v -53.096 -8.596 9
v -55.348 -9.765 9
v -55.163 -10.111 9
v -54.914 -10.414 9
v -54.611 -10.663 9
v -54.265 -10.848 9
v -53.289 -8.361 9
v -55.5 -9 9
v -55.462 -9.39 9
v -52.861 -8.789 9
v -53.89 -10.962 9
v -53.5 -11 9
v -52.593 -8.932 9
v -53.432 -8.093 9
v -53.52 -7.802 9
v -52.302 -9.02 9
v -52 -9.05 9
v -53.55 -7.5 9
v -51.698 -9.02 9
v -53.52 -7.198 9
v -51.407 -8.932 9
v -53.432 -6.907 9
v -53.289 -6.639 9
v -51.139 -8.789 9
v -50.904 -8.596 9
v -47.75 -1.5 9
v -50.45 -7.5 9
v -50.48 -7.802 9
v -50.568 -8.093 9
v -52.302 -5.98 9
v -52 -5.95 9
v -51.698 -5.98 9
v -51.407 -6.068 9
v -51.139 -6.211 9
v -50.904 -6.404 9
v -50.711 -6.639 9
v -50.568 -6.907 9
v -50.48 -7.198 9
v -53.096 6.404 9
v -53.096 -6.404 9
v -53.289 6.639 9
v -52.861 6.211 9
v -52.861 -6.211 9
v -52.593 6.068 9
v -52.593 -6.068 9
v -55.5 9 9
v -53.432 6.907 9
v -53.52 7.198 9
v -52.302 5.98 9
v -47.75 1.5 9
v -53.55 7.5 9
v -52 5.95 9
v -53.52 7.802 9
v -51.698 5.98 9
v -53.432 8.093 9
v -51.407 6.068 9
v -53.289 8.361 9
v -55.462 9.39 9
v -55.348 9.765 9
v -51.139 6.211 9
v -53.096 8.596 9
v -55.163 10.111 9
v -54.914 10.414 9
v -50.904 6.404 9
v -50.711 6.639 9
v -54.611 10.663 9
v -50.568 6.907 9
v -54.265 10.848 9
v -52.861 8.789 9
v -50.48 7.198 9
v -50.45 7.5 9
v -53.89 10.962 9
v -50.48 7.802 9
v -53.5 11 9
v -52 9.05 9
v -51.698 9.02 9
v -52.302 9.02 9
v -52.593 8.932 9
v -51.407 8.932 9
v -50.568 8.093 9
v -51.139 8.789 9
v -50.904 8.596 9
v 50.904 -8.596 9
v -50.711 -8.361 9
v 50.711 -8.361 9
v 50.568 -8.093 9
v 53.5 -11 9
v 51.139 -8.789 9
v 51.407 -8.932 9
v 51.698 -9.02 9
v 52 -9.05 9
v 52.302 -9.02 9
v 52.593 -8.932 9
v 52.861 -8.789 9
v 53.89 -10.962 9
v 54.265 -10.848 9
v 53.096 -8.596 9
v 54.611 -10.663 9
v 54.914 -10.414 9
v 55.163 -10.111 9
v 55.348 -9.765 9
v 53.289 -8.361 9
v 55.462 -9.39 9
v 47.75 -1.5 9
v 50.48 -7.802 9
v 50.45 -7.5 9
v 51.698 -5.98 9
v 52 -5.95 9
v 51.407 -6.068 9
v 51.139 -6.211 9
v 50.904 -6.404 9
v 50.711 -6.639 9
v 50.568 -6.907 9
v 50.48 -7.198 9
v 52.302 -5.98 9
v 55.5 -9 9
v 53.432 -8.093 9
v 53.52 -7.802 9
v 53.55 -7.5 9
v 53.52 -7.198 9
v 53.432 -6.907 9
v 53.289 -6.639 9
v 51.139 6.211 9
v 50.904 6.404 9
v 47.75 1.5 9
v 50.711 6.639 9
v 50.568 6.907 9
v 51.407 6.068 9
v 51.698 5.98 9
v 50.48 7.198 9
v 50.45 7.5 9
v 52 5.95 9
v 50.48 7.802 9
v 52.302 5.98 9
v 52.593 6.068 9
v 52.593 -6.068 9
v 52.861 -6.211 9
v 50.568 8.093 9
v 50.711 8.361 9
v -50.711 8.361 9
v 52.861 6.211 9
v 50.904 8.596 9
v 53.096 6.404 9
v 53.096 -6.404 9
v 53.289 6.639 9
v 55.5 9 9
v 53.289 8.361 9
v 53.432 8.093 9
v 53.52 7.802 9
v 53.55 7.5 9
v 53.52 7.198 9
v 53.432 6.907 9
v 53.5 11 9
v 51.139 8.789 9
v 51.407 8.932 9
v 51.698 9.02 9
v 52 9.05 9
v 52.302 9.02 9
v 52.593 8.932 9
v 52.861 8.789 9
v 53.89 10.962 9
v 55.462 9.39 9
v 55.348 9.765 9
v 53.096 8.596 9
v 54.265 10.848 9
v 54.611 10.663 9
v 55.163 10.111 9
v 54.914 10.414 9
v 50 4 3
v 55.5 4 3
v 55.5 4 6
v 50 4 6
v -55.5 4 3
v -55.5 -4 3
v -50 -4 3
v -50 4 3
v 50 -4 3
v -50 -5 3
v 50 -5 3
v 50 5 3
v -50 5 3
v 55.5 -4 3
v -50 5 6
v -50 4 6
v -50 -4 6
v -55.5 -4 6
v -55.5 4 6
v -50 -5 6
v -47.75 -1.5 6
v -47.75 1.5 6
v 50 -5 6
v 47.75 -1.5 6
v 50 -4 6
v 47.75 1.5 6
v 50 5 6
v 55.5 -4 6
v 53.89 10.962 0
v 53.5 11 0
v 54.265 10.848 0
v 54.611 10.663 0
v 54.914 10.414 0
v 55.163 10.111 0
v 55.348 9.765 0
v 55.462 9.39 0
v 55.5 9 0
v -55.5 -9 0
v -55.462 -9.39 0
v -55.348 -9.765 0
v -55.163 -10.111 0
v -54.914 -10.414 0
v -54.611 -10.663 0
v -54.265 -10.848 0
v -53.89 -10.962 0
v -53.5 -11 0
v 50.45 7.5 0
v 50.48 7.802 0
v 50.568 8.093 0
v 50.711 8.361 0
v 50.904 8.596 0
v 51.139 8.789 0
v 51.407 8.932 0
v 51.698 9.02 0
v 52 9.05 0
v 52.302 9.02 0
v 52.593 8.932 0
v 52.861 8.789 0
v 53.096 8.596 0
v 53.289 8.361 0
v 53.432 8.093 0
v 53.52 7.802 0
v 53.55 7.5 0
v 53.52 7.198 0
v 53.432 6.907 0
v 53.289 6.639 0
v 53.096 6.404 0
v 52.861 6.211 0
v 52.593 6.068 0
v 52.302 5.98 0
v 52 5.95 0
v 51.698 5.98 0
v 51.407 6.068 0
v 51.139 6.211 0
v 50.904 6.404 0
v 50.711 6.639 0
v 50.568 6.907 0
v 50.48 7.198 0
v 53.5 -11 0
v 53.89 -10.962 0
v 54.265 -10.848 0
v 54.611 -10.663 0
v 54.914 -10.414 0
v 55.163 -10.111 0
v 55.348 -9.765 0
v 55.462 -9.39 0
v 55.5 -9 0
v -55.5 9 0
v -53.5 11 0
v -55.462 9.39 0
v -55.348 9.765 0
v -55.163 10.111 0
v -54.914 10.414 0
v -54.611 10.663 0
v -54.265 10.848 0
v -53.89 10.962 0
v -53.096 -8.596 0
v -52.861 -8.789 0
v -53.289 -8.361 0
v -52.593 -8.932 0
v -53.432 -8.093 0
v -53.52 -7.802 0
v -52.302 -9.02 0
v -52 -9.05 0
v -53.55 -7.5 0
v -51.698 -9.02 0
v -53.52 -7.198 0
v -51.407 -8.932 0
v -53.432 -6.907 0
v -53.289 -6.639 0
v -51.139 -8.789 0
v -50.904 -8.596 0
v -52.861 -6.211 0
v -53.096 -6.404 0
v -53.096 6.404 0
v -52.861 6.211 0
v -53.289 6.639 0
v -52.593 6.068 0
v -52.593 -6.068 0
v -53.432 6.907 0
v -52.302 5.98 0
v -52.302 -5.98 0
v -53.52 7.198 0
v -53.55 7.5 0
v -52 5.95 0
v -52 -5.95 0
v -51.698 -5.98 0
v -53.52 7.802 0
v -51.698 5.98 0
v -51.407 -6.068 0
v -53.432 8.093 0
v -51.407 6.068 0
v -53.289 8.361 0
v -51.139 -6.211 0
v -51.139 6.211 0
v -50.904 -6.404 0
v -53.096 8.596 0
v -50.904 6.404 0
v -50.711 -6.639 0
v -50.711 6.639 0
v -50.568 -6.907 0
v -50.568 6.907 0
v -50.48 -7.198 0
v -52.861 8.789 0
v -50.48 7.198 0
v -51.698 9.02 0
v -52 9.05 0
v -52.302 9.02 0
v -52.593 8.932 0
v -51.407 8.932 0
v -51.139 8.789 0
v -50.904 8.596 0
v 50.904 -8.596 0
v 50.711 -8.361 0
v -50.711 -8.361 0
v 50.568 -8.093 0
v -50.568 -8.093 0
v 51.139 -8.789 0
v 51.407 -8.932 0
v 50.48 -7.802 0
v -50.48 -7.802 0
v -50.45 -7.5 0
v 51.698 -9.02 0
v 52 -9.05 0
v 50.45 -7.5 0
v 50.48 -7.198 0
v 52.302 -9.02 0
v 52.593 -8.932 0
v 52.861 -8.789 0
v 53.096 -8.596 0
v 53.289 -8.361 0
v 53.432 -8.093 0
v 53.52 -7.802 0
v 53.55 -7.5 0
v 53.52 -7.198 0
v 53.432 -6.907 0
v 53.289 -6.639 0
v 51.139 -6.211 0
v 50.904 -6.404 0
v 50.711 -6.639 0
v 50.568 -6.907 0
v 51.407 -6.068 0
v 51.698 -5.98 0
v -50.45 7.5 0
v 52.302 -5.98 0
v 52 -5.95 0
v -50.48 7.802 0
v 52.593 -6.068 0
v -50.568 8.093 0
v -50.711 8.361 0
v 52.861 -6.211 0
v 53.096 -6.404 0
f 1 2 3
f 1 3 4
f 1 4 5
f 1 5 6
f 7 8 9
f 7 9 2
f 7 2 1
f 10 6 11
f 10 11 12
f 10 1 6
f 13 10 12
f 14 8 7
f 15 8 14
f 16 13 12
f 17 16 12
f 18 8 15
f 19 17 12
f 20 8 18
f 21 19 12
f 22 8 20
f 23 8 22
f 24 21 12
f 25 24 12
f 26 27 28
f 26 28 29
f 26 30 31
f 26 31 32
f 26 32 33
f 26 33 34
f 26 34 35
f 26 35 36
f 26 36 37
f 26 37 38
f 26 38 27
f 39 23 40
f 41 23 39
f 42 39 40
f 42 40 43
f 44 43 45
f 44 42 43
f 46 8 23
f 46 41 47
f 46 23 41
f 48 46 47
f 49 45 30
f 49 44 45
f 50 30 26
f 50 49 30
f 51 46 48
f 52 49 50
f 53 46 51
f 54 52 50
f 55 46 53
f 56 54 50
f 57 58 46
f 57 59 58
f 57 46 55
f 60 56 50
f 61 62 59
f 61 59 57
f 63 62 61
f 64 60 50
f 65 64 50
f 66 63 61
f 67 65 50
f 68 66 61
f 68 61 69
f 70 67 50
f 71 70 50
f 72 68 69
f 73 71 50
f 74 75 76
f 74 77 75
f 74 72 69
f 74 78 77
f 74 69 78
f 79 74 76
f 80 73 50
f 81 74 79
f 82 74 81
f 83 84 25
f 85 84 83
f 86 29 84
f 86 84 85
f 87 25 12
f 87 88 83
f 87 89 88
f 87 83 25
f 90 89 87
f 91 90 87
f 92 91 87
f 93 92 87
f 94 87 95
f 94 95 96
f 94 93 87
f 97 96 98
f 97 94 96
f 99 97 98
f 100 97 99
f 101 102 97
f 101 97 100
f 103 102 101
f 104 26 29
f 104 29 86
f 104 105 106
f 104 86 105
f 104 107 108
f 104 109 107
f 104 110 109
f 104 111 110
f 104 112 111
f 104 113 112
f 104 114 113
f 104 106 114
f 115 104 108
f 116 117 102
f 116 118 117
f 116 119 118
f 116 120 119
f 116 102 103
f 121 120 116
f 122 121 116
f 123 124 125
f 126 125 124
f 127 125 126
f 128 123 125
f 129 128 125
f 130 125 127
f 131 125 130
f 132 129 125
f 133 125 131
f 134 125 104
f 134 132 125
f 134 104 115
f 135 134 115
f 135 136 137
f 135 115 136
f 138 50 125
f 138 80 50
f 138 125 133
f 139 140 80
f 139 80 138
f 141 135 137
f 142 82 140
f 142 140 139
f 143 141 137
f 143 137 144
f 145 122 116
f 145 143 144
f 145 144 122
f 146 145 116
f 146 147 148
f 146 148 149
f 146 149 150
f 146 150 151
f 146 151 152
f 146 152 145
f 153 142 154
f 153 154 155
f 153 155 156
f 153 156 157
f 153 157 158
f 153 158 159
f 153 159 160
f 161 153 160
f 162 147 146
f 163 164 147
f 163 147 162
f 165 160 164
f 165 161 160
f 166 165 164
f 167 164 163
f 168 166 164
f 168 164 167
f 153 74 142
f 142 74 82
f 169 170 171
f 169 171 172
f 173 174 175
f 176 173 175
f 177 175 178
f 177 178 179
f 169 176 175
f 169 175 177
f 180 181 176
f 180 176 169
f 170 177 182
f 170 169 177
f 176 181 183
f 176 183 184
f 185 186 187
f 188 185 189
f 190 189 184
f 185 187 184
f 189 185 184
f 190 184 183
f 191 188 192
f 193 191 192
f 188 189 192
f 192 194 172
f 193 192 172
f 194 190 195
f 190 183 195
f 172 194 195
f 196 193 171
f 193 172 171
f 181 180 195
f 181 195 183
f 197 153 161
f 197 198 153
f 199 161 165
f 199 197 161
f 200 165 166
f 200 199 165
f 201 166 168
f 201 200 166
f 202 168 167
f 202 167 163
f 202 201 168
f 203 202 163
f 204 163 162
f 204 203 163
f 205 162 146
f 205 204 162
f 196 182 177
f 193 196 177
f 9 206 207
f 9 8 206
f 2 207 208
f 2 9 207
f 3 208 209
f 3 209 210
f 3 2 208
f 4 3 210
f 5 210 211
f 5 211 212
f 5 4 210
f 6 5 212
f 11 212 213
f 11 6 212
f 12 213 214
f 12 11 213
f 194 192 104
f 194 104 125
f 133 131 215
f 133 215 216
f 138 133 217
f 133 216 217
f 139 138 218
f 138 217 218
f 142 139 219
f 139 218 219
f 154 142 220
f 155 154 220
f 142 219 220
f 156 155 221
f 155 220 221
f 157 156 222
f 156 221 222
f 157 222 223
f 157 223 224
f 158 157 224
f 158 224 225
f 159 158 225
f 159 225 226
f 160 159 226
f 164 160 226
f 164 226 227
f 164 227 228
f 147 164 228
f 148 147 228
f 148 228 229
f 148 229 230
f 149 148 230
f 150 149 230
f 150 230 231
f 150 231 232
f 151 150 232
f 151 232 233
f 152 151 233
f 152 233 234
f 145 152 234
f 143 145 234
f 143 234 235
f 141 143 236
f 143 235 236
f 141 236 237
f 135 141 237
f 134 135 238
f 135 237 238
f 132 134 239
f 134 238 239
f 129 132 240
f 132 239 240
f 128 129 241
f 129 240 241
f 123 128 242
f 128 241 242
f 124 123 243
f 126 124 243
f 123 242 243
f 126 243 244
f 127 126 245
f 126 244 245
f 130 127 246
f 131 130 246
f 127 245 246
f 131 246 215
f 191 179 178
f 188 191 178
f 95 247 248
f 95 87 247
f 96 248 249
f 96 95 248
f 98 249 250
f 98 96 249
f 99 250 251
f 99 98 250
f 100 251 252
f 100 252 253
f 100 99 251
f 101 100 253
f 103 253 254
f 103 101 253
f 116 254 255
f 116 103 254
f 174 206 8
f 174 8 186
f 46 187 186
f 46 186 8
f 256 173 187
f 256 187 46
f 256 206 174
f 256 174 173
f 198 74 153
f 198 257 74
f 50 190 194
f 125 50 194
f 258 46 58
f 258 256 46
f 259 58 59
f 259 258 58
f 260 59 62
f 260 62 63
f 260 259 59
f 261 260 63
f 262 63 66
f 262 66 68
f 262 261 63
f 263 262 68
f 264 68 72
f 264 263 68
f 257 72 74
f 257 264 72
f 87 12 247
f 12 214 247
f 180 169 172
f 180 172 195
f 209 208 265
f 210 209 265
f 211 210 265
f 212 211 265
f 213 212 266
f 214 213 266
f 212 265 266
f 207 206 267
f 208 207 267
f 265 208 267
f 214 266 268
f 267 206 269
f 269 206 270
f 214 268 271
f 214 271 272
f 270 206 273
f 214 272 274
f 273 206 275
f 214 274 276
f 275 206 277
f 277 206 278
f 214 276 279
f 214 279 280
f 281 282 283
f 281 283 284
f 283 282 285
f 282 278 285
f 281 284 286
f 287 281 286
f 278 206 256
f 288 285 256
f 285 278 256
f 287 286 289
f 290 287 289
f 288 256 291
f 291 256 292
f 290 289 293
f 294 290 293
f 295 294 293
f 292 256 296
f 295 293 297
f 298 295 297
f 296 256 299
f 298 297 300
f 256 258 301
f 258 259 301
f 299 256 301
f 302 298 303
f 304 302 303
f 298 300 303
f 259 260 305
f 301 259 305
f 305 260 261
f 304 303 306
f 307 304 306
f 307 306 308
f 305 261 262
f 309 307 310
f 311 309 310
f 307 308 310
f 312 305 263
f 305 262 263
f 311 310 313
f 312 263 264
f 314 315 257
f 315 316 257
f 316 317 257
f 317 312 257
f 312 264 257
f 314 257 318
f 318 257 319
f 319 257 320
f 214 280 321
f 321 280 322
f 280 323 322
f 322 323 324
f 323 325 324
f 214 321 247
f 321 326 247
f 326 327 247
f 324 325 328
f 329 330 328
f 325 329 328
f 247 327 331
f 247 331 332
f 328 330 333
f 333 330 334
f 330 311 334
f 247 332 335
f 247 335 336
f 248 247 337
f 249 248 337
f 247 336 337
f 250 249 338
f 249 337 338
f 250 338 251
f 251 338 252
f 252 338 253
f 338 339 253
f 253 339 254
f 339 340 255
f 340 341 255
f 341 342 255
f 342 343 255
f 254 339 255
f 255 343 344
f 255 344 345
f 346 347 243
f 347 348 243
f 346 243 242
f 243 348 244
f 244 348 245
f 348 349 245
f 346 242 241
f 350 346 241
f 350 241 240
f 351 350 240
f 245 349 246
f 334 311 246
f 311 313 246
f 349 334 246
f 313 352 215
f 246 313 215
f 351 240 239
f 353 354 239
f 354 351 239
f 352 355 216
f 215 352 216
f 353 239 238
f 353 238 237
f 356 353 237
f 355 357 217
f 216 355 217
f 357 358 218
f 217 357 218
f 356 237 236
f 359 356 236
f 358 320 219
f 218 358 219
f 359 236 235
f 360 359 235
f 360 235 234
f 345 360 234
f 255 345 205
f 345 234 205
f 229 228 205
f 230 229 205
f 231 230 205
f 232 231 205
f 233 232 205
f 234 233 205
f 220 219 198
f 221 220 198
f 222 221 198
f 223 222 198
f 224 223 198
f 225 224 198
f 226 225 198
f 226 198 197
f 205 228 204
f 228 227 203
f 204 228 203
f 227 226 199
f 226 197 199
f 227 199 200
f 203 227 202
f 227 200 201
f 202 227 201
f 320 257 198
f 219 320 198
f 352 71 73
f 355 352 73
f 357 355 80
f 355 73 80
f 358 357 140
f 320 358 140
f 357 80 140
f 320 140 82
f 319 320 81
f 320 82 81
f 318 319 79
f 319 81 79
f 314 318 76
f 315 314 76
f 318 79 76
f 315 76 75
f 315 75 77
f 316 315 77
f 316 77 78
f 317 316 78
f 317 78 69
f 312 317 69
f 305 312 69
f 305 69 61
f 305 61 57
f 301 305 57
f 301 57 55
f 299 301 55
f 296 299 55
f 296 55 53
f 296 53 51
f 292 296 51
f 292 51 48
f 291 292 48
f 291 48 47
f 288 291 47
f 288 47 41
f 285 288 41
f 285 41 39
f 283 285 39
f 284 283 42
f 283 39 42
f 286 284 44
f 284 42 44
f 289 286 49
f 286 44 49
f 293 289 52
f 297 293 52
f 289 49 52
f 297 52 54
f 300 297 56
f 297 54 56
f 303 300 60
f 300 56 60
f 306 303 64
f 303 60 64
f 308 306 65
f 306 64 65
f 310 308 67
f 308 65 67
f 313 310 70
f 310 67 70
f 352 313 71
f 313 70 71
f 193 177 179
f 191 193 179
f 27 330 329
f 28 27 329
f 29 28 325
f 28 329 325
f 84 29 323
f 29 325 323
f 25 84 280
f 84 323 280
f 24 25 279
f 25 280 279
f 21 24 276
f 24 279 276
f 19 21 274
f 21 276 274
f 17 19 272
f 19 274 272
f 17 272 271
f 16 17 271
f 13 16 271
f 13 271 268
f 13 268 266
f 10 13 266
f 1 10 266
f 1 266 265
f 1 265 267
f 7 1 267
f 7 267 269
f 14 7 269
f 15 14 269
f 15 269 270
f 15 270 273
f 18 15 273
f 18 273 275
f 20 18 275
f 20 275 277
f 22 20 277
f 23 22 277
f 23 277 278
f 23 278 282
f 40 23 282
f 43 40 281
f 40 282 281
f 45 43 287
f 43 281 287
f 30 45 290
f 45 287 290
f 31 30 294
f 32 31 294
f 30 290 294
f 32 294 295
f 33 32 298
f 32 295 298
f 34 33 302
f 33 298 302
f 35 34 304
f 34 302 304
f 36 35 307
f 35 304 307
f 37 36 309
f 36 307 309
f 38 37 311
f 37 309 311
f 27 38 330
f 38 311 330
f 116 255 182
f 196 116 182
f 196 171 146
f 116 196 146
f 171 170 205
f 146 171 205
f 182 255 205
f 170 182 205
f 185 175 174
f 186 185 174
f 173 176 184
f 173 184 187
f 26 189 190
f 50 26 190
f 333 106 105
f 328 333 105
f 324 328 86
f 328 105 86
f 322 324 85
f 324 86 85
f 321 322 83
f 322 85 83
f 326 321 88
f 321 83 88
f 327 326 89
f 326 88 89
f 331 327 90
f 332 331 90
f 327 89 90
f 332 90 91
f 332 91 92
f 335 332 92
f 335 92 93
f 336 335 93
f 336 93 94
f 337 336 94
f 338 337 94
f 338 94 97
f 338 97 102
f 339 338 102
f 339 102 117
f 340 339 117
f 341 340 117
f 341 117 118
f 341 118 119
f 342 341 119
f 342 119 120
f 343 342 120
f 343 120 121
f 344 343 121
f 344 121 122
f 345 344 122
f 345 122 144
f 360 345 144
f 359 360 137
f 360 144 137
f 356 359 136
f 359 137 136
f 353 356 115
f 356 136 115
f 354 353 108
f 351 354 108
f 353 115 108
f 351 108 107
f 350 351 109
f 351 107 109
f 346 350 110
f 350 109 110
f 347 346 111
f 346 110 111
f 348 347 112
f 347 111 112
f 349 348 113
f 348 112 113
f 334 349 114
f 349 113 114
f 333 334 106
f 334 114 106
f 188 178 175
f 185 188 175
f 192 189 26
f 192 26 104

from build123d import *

# Parameters (mm, degrees)
SKETCH_W              = 111
SKETCH_H              = 22
PAD_DEPTH             = 3
PAD001_DEPTH          = 3
SKETCH002_W           = 111
SKETCH002_H           = 22
SKETCH002_W_2         = 95.5
SKETCH002_H_2         = 3
PAD002_DEPTH          = 3
SKETCH003_R           = 1.55
POCKET_DEPTH          = 236.034037
POLARPATTERN_COUNT    = 2
POLARPATTERN001_COUNT = 2
POLARPATTERN002_COUNT = 2
FILLET_R              = 2


with BuildPart() as part:
    # Sketch → Pad (new body)
    with BuildSketch(Plane.XY):
        Rectangle(SKETCH_W, SKETCH_H)
    extrude(amount=PAD_DEPTH)

    # Sketch001 (on Face6 of Pad) → Pad001 (join)
    with BuildSketch(Plane.XY.offset(3)):
        Polygon((-55.5, 11), (55.5, 11), (55.5, 4), (50, 4), (50, 5), (-50, 5), (-50, 4), (-55.5, 4), align=None)
        Polygon((-55.5, -11), (55.5, -11), (55.5, -4), (50, -4), (50, -5), (-50, -5), (-50, -4), (-55.5, -4), align=None)
    extrude(amount=PAD001_DEPTH)

    # Sketch002 (on Face12 of Pad001) → Pad002 (join)
    with BuildSketch(Plane.XY.offset(6)):
        Rectangle(SKETCH002_W, SKETCH002_H)
        Rectangle(SKETCH002_W_2, SKETCH002_H_2, mode=Mode.SUBTRACT)
    extrude(amount=PAD002_DEPTH)

    # Sketch003 (on Face26 of Pad002) → Pocket (cut, through all)
    with BuildSketch(Plane.XY.offset(9)):
        with Locations((-52, 7.5)):
            Circle(SKETCH003_R)
    pocket = extrude(amount=-POCKET_DEPTH, mode=Mode.SUBTRACT)

    # PolarPattern: Pocket ×2 about axis
    polarpattern_axis = Axis((0, 0, 0), (0, 1, 0))
    for i in range(1, POLARPATTERN_COUNT):
        add(pocket.rotate(polarpattern_axis, i * 360 / POLARPATTERN_COUNT), mode=Mode.SUBTRACT)

    # PolarPattern001: Pocket ×2 about axis
    polarpattern001_axis = Axis((0, 0, 0), (1, 0, 0))
    for i in range(1, POLARPATTERN001_COUNT):
        add(pocket.rotate(polarpattern001_axis, i * 360 / POLARPATTERN001_COUNT), mode=Mode.SUBTRACT)

    # PolarPattern002: Pocket ×2 about axis
    polarpattern002_axis = Axis((0, 0, 9), (0, 0, 1))
    for i in range(1, POLARPATTERN002_COUNT):
        add(pocket.rotate(polarpattern002_axis, i * 360 / POLARPATTERN002_COUNT), mode=Mode.SUBTRACT)

    # Fillet
    fillet_edges = [part.edges().sort_by_distance(p)[0] for p in [
        (55.5, 11, 7.5),
        (55.5, 11, 4.5),
        (55.5, 11, 1.5),
        (55.5, -11, 7.5),
        (-55.5, 11, 7.5),
        (-55.5, -11, 7.5),
    ]]
    fillet(fillet_edges, radius=FILLET_R)


solid = part.part
